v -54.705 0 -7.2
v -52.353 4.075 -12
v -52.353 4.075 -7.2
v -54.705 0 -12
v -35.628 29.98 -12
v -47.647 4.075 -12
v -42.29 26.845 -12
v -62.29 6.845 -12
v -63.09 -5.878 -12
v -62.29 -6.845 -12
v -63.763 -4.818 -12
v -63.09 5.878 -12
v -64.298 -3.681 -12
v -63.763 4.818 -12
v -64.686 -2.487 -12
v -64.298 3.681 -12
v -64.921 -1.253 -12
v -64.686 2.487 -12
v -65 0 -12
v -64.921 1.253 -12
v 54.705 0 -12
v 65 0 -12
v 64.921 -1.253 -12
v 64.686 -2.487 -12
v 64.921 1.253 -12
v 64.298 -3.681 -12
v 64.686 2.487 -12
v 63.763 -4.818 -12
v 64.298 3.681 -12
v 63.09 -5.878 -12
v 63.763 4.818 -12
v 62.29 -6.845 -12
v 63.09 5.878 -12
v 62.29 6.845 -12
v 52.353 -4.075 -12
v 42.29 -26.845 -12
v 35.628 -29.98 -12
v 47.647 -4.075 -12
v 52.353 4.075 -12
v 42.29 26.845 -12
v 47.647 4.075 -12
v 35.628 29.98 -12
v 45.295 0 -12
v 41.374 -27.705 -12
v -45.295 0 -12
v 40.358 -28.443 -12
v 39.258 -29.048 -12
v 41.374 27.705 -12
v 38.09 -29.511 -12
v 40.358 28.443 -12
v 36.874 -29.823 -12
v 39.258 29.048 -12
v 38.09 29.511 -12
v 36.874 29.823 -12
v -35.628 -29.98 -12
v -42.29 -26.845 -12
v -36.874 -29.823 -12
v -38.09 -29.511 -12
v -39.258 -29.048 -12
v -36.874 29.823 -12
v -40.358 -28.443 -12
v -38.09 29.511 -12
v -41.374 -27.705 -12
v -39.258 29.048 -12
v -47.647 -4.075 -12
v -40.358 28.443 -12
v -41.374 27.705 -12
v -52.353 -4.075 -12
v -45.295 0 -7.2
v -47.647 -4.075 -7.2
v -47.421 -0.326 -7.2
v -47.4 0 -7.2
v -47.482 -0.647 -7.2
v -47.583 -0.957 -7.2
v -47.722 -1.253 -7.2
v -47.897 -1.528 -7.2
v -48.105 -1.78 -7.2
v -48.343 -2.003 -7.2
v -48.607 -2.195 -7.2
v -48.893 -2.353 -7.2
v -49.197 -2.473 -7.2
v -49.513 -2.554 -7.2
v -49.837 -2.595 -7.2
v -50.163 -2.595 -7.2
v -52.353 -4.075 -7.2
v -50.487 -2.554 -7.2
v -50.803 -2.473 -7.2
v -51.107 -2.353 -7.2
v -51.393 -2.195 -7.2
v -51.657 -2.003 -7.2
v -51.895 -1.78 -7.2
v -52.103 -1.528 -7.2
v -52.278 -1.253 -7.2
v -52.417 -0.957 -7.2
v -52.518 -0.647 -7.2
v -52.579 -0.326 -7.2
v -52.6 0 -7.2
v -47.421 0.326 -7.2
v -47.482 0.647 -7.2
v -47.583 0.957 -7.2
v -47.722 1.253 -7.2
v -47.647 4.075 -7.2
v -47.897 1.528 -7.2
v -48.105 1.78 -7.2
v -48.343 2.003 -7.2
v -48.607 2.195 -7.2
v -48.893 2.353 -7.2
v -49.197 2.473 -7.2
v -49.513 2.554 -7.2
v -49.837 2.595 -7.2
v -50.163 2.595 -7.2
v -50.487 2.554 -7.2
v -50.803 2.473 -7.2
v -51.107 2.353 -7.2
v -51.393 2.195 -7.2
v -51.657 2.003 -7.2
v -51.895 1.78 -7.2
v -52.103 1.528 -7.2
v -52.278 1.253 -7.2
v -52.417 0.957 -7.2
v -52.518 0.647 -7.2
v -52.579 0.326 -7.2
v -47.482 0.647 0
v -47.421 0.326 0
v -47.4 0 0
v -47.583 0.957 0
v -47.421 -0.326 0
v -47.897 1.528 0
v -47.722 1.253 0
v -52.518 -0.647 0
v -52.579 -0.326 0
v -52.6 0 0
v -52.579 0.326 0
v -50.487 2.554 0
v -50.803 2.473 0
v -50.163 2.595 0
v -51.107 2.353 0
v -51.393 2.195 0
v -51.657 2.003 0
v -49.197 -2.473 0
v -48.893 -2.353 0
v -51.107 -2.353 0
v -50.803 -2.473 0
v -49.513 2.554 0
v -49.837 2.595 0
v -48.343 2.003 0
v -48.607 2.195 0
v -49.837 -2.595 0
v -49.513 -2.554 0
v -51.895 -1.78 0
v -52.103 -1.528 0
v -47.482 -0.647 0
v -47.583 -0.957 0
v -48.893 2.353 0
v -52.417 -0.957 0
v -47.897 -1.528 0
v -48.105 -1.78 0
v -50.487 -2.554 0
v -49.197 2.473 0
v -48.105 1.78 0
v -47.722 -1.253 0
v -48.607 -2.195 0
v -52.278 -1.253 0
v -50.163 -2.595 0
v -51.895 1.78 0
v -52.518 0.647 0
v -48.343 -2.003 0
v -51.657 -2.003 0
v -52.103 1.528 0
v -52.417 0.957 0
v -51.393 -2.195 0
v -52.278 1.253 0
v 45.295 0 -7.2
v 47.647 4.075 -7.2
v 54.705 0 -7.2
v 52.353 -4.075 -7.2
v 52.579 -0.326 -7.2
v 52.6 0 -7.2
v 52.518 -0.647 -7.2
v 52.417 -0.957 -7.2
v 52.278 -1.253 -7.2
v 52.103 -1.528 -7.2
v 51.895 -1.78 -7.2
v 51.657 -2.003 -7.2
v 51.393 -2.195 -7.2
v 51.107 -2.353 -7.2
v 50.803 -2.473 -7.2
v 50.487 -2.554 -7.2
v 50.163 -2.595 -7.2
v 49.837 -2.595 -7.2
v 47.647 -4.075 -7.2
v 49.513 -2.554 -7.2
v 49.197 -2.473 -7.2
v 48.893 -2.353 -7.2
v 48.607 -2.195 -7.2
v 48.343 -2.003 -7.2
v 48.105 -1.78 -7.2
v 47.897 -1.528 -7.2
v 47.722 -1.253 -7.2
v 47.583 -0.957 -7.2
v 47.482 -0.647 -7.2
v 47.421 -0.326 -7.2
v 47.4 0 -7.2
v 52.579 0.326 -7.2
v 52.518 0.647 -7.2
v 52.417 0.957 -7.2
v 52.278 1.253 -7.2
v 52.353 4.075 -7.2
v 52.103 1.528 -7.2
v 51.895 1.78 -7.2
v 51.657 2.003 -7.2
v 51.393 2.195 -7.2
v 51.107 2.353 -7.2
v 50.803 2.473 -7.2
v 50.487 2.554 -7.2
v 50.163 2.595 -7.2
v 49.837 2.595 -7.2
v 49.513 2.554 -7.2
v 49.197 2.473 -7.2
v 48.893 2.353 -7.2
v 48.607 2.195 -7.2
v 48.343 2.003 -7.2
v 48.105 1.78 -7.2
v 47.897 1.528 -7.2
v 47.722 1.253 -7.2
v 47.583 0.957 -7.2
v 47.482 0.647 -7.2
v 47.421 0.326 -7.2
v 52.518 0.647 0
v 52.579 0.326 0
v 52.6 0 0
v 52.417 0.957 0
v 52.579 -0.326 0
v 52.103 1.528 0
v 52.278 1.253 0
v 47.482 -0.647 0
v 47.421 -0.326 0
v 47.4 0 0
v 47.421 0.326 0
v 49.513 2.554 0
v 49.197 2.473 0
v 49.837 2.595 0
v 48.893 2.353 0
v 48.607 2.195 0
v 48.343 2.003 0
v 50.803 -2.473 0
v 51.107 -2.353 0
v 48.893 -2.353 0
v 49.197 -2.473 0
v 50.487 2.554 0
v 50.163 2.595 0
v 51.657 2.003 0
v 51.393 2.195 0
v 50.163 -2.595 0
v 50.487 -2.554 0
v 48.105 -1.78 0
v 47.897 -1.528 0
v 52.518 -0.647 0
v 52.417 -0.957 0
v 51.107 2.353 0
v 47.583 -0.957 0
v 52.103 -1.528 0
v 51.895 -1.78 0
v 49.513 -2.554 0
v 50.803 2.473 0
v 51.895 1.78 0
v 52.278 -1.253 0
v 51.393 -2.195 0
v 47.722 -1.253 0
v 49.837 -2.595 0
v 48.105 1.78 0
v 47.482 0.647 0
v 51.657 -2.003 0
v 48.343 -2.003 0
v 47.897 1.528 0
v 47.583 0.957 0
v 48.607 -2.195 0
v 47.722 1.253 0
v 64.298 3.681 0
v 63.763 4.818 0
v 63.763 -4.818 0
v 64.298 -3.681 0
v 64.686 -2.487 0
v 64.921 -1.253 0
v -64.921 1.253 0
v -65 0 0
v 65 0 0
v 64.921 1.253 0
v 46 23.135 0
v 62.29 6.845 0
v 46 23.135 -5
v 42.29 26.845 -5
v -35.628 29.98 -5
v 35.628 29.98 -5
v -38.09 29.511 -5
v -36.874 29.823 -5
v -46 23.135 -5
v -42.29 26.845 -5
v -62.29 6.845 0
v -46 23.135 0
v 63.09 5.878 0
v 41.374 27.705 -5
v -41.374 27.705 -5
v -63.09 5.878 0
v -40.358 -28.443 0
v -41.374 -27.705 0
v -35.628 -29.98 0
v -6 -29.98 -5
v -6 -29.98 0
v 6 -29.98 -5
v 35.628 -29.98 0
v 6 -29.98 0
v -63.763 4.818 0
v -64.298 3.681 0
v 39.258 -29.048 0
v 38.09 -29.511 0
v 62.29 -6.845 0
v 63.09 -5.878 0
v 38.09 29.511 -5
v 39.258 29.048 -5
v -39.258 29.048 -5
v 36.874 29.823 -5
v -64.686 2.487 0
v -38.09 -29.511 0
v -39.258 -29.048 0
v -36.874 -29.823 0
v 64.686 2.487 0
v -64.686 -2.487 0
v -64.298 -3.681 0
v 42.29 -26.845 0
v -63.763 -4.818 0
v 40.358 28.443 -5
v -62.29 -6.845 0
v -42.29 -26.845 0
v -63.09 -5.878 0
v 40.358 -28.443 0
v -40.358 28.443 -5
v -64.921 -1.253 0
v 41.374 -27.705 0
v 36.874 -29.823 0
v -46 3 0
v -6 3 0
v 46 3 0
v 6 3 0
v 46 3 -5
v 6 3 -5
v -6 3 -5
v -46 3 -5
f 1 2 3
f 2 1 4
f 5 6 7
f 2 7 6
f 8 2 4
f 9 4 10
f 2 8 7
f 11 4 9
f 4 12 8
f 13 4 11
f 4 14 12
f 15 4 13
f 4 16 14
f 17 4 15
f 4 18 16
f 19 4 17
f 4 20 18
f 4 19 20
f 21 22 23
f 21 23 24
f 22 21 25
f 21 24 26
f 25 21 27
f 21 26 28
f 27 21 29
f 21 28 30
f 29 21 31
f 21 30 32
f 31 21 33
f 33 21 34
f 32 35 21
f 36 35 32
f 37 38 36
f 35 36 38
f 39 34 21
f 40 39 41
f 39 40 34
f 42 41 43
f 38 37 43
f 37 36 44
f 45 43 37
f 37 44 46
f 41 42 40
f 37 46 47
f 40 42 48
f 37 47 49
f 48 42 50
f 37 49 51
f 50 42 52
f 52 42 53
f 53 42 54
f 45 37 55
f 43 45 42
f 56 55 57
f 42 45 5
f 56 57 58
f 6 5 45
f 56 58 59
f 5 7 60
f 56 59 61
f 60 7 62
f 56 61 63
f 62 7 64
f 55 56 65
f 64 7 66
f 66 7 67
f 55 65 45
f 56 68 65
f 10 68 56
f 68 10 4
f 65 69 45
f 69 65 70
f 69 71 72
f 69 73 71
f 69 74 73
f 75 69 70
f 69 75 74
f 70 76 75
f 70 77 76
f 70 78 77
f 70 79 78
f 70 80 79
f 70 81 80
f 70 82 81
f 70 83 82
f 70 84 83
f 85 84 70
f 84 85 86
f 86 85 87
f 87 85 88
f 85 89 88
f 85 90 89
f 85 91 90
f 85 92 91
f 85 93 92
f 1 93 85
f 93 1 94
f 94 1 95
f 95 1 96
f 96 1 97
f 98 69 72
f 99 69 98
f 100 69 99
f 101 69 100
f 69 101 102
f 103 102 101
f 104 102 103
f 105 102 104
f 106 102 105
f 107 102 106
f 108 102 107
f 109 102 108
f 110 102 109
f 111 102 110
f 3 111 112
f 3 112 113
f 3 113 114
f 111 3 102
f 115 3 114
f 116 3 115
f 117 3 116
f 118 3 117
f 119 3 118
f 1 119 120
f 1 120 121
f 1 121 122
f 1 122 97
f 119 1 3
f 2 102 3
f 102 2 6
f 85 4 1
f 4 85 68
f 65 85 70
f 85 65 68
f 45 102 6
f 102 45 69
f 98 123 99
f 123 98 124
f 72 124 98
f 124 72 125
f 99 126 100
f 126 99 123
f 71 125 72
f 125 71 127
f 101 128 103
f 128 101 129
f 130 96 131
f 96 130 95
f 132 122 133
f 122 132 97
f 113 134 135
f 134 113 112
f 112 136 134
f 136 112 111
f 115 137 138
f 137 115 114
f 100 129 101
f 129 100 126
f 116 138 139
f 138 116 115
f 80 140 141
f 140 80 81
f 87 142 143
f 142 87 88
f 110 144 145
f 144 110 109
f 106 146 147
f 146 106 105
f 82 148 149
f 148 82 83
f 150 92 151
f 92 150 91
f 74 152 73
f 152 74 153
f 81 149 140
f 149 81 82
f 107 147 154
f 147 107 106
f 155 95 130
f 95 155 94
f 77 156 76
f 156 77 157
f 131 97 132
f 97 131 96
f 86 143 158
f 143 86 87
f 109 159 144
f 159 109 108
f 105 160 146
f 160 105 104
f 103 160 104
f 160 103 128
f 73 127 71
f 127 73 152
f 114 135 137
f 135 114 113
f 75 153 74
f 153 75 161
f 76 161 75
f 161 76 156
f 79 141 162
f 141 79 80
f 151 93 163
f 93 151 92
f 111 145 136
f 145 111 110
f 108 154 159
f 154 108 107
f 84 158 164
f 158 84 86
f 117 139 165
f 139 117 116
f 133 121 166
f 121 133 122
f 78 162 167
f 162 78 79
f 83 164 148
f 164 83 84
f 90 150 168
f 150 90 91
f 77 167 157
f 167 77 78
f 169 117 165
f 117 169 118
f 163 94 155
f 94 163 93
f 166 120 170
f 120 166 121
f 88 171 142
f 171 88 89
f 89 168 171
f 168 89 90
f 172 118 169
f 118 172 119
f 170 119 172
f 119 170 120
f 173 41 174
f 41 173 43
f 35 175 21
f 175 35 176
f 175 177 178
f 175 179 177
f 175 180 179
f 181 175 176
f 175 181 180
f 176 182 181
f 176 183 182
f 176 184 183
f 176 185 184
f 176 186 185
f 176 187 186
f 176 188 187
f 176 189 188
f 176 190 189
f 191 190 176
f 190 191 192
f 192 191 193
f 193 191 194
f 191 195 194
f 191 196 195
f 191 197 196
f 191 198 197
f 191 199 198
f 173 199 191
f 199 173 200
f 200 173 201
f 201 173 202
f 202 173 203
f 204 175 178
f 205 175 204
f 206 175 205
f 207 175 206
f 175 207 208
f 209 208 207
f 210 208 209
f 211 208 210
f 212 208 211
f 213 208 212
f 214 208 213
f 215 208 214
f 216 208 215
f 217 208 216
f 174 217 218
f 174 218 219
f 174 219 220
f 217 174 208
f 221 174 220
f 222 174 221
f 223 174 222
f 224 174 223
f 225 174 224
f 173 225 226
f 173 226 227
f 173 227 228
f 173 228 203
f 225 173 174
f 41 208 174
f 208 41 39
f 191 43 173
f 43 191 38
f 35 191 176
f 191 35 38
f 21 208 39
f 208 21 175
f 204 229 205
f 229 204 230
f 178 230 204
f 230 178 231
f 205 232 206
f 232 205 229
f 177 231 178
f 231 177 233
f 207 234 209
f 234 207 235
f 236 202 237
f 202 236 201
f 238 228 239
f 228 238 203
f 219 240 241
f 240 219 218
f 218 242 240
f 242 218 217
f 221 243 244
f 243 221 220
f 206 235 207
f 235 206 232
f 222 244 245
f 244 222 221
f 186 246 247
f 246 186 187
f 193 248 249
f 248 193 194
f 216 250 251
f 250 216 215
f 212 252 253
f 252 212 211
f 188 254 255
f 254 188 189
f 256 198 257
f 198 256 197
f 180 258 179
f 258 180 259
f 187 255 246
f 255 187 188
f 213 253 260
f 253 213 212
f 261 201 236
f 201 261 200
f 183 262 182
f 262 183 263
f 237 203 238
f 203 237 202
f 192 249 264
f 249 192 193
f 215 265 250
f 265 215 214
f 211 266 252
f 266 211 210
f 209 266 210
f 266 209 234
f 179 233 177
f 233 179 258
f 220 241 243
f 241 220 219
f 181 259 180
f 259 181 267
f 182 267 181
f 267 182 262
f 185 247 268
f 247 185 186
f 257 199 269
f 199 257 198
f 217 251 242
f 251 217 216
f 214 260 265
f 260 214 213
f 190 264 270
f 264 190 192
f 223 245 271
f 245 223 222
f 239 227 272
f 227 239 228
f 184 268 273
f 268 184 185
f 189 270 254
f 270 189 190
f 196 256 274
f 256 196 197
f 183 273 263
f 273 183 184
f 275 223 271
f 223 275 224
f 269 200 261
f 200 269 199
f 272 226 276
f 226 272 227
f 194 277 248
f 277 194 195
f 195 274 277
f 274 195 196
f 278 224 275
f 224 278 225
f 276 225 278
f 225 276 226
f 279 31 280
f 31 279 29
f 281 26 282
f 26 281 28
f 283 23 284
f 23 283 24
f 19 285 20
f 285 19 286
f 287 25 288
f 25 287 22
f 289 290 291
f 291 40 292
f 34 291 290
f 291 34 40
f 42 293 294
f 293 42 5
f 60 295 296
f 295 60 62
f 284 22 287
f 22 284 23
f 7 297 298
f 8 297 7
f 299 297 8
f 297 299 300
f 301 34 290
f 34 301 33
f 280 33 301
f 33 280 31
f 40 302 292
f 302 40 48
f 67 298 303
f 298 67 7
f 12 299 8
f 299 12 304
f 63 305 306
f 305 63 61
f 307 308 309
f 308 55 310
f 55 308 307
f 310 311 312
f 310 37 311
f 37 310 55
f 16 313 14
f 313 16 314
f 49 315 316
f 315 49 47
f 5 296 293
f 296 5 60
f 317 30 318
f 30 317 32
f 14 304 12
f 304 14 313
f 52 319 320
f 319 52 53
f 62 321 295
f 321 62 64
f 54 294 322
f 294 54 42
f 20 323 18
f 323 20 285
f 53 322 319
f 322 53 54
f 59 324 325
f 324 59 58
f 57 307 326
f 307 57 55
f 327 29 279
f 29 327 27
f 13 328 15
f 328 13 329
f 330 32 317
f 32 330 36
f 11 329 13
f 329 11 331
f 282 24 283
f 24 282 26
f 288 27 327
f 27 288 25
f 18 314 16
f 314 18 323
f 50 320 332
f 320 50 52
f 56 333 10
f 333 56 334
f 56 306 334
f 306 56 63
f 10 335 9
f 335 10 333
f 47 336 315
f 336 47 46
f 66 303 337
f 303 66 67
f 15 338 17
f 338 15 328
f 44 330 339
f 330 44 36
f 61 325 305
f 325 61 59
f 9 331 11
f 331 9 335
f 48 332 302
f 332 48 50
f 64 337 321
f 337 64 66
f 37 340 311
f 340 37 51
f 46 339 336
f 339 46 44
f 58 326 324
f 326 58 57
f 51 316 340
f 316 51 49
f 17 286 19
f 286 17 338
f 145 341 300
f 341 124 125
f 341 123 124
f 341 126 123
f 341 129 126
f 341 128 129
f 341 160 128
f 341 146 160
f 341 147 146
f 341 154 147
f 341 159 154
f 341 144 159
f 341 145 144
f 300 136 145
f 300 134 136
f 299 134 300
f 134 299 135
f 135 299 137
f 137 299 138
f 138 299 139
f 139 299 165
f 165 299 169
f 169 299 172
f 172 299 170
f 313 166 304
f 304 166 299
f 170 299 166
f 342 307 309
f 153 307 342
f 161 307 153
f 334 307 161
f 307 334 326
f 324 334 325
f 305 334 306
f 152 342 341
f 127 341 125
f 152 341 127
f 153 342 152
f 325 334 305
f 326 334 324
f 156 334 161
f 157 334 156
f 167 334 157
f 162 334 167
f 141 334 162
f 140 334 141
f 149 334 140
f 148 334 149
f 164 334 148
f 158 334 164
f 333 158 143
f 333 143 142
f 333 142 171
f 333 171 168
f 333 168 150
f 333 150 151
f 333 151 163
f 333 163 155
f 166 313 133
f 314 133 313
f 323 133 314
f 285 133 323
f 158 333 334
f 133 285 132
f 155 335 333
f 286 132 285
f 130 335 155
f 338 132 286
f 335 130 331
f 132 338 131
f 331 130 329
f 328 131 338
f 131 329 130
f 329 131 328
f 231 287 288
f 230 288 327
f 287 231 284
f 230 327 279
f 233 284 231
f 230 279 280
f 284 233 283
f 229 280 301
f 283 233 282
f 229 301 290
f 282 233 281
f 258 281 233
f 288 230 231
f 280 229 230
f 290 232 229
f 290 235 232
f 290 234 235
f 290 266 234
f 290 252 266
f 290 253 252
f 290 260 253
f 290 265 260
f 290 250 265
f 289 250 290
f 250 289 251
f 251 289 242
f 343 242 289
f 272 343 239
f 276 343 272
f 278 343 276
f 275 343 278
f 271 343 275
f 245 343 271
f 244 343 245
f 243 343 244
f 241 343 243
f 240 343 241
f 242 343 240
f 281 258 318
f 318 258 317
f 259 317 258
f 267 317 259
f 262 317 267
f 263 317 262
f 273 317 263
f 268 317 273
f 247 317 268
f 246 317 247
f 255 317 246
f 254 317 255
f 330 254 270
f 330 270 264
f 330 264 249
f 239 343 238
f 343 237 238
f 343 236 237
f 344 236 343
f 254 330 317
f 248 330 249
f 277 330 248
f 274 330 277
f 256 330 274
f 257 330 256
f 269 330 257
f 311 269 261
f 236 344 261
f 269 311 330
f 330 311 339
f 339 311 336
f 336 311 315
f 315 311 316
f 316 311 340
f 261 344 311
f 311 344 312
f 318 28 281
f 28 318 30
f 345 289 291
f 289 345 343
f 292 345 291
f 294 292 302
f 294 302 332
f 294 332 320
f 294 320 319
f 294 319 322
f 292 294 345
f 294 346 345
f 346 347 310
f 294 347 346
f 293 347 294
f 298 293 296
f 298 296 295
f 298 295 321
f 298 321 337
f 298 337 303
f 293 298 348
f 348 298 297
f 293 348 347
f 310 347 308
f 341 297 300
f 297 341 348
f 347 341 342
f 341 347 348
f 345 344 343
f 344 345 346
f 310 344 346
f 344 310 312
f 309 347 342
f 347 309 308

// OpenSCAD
// file: bracket-common.scad
module plate3d(height){
    translate([0,0,-height]){
        linear_extrude(height = height, center = false, convexity = 10, twist = 0){
            plate2d();
        }
    }
}

module plate2d(){
    cornerX = 35;
    cornerY = 20;
    tipX = 55;
    tipY = 0;

    hull(){
        corner(-tipX,tipY);
        corner(-cornerX,cornerY);
        corner(-cornerX,-cornerY);
        corner(cornerX,cornerY);
        corner(cornerX,-cornerY);
        corner(tipX,tipY);
    }
}

module corner(x,y){
    translate([x,y,0]){
        circle(r=10);
    }
}
// main file
include <bracket-common.scad>;

$fn=50;

bottomPlate();

module bottomPlate(){
    plateHeight = 12;
    holeX = 50;
    holeY = 0;
    difference(){
        plate3d(plateHeight);
        translate([-holeX, holeY, -plateHeight]){
            m5nutWithScrewHole();
        }
        translate([holeX, holeY, -plateHeight]){
            m5nutWithScrewHole();
        }
        cutoutHeight = 5;
        translate([0, 16.5, -cutoutHeight/2]){
            cube([92, 27, cutoutHeight], center=true);
        }
        translate([0, 0, -cutoutHeight/2]){
            cube([12, 60, cutoutHeight], center=true);
        }
    }
}

module m5nutWithScrewHole(){
    screwHoleHeight = 20;
    screwholeRadius = 5.2 / 2;
    m5nut();
    cylinder(screwHoleHeight,screwholeRadius,screwholeRadius);
}

module m5nut(){
    height = 4.8;
    shortDiagonale = 8.15;
    longDiagonale = shortDiagonale * 2 / sqrt(3);
    echo(longDiagonale);
    linear_extrude(height = height, center = false, convexity = 10, twist = 0){
        hexagon(longDiagonale);
    }
}

module hexagon(longDiagonale){
    radius = longDiagonale / 2;
    polygon(points=[
        [radius, 0],
        [radius*cos(60),radius*sin(60)],
        [radius*cos(120),radius*sin(120)],
        [-radius,0],
        [radius*cos(240),radius*sin(240)],
        [radius*cos(300),radius*sin(300)],
    ]);
}
